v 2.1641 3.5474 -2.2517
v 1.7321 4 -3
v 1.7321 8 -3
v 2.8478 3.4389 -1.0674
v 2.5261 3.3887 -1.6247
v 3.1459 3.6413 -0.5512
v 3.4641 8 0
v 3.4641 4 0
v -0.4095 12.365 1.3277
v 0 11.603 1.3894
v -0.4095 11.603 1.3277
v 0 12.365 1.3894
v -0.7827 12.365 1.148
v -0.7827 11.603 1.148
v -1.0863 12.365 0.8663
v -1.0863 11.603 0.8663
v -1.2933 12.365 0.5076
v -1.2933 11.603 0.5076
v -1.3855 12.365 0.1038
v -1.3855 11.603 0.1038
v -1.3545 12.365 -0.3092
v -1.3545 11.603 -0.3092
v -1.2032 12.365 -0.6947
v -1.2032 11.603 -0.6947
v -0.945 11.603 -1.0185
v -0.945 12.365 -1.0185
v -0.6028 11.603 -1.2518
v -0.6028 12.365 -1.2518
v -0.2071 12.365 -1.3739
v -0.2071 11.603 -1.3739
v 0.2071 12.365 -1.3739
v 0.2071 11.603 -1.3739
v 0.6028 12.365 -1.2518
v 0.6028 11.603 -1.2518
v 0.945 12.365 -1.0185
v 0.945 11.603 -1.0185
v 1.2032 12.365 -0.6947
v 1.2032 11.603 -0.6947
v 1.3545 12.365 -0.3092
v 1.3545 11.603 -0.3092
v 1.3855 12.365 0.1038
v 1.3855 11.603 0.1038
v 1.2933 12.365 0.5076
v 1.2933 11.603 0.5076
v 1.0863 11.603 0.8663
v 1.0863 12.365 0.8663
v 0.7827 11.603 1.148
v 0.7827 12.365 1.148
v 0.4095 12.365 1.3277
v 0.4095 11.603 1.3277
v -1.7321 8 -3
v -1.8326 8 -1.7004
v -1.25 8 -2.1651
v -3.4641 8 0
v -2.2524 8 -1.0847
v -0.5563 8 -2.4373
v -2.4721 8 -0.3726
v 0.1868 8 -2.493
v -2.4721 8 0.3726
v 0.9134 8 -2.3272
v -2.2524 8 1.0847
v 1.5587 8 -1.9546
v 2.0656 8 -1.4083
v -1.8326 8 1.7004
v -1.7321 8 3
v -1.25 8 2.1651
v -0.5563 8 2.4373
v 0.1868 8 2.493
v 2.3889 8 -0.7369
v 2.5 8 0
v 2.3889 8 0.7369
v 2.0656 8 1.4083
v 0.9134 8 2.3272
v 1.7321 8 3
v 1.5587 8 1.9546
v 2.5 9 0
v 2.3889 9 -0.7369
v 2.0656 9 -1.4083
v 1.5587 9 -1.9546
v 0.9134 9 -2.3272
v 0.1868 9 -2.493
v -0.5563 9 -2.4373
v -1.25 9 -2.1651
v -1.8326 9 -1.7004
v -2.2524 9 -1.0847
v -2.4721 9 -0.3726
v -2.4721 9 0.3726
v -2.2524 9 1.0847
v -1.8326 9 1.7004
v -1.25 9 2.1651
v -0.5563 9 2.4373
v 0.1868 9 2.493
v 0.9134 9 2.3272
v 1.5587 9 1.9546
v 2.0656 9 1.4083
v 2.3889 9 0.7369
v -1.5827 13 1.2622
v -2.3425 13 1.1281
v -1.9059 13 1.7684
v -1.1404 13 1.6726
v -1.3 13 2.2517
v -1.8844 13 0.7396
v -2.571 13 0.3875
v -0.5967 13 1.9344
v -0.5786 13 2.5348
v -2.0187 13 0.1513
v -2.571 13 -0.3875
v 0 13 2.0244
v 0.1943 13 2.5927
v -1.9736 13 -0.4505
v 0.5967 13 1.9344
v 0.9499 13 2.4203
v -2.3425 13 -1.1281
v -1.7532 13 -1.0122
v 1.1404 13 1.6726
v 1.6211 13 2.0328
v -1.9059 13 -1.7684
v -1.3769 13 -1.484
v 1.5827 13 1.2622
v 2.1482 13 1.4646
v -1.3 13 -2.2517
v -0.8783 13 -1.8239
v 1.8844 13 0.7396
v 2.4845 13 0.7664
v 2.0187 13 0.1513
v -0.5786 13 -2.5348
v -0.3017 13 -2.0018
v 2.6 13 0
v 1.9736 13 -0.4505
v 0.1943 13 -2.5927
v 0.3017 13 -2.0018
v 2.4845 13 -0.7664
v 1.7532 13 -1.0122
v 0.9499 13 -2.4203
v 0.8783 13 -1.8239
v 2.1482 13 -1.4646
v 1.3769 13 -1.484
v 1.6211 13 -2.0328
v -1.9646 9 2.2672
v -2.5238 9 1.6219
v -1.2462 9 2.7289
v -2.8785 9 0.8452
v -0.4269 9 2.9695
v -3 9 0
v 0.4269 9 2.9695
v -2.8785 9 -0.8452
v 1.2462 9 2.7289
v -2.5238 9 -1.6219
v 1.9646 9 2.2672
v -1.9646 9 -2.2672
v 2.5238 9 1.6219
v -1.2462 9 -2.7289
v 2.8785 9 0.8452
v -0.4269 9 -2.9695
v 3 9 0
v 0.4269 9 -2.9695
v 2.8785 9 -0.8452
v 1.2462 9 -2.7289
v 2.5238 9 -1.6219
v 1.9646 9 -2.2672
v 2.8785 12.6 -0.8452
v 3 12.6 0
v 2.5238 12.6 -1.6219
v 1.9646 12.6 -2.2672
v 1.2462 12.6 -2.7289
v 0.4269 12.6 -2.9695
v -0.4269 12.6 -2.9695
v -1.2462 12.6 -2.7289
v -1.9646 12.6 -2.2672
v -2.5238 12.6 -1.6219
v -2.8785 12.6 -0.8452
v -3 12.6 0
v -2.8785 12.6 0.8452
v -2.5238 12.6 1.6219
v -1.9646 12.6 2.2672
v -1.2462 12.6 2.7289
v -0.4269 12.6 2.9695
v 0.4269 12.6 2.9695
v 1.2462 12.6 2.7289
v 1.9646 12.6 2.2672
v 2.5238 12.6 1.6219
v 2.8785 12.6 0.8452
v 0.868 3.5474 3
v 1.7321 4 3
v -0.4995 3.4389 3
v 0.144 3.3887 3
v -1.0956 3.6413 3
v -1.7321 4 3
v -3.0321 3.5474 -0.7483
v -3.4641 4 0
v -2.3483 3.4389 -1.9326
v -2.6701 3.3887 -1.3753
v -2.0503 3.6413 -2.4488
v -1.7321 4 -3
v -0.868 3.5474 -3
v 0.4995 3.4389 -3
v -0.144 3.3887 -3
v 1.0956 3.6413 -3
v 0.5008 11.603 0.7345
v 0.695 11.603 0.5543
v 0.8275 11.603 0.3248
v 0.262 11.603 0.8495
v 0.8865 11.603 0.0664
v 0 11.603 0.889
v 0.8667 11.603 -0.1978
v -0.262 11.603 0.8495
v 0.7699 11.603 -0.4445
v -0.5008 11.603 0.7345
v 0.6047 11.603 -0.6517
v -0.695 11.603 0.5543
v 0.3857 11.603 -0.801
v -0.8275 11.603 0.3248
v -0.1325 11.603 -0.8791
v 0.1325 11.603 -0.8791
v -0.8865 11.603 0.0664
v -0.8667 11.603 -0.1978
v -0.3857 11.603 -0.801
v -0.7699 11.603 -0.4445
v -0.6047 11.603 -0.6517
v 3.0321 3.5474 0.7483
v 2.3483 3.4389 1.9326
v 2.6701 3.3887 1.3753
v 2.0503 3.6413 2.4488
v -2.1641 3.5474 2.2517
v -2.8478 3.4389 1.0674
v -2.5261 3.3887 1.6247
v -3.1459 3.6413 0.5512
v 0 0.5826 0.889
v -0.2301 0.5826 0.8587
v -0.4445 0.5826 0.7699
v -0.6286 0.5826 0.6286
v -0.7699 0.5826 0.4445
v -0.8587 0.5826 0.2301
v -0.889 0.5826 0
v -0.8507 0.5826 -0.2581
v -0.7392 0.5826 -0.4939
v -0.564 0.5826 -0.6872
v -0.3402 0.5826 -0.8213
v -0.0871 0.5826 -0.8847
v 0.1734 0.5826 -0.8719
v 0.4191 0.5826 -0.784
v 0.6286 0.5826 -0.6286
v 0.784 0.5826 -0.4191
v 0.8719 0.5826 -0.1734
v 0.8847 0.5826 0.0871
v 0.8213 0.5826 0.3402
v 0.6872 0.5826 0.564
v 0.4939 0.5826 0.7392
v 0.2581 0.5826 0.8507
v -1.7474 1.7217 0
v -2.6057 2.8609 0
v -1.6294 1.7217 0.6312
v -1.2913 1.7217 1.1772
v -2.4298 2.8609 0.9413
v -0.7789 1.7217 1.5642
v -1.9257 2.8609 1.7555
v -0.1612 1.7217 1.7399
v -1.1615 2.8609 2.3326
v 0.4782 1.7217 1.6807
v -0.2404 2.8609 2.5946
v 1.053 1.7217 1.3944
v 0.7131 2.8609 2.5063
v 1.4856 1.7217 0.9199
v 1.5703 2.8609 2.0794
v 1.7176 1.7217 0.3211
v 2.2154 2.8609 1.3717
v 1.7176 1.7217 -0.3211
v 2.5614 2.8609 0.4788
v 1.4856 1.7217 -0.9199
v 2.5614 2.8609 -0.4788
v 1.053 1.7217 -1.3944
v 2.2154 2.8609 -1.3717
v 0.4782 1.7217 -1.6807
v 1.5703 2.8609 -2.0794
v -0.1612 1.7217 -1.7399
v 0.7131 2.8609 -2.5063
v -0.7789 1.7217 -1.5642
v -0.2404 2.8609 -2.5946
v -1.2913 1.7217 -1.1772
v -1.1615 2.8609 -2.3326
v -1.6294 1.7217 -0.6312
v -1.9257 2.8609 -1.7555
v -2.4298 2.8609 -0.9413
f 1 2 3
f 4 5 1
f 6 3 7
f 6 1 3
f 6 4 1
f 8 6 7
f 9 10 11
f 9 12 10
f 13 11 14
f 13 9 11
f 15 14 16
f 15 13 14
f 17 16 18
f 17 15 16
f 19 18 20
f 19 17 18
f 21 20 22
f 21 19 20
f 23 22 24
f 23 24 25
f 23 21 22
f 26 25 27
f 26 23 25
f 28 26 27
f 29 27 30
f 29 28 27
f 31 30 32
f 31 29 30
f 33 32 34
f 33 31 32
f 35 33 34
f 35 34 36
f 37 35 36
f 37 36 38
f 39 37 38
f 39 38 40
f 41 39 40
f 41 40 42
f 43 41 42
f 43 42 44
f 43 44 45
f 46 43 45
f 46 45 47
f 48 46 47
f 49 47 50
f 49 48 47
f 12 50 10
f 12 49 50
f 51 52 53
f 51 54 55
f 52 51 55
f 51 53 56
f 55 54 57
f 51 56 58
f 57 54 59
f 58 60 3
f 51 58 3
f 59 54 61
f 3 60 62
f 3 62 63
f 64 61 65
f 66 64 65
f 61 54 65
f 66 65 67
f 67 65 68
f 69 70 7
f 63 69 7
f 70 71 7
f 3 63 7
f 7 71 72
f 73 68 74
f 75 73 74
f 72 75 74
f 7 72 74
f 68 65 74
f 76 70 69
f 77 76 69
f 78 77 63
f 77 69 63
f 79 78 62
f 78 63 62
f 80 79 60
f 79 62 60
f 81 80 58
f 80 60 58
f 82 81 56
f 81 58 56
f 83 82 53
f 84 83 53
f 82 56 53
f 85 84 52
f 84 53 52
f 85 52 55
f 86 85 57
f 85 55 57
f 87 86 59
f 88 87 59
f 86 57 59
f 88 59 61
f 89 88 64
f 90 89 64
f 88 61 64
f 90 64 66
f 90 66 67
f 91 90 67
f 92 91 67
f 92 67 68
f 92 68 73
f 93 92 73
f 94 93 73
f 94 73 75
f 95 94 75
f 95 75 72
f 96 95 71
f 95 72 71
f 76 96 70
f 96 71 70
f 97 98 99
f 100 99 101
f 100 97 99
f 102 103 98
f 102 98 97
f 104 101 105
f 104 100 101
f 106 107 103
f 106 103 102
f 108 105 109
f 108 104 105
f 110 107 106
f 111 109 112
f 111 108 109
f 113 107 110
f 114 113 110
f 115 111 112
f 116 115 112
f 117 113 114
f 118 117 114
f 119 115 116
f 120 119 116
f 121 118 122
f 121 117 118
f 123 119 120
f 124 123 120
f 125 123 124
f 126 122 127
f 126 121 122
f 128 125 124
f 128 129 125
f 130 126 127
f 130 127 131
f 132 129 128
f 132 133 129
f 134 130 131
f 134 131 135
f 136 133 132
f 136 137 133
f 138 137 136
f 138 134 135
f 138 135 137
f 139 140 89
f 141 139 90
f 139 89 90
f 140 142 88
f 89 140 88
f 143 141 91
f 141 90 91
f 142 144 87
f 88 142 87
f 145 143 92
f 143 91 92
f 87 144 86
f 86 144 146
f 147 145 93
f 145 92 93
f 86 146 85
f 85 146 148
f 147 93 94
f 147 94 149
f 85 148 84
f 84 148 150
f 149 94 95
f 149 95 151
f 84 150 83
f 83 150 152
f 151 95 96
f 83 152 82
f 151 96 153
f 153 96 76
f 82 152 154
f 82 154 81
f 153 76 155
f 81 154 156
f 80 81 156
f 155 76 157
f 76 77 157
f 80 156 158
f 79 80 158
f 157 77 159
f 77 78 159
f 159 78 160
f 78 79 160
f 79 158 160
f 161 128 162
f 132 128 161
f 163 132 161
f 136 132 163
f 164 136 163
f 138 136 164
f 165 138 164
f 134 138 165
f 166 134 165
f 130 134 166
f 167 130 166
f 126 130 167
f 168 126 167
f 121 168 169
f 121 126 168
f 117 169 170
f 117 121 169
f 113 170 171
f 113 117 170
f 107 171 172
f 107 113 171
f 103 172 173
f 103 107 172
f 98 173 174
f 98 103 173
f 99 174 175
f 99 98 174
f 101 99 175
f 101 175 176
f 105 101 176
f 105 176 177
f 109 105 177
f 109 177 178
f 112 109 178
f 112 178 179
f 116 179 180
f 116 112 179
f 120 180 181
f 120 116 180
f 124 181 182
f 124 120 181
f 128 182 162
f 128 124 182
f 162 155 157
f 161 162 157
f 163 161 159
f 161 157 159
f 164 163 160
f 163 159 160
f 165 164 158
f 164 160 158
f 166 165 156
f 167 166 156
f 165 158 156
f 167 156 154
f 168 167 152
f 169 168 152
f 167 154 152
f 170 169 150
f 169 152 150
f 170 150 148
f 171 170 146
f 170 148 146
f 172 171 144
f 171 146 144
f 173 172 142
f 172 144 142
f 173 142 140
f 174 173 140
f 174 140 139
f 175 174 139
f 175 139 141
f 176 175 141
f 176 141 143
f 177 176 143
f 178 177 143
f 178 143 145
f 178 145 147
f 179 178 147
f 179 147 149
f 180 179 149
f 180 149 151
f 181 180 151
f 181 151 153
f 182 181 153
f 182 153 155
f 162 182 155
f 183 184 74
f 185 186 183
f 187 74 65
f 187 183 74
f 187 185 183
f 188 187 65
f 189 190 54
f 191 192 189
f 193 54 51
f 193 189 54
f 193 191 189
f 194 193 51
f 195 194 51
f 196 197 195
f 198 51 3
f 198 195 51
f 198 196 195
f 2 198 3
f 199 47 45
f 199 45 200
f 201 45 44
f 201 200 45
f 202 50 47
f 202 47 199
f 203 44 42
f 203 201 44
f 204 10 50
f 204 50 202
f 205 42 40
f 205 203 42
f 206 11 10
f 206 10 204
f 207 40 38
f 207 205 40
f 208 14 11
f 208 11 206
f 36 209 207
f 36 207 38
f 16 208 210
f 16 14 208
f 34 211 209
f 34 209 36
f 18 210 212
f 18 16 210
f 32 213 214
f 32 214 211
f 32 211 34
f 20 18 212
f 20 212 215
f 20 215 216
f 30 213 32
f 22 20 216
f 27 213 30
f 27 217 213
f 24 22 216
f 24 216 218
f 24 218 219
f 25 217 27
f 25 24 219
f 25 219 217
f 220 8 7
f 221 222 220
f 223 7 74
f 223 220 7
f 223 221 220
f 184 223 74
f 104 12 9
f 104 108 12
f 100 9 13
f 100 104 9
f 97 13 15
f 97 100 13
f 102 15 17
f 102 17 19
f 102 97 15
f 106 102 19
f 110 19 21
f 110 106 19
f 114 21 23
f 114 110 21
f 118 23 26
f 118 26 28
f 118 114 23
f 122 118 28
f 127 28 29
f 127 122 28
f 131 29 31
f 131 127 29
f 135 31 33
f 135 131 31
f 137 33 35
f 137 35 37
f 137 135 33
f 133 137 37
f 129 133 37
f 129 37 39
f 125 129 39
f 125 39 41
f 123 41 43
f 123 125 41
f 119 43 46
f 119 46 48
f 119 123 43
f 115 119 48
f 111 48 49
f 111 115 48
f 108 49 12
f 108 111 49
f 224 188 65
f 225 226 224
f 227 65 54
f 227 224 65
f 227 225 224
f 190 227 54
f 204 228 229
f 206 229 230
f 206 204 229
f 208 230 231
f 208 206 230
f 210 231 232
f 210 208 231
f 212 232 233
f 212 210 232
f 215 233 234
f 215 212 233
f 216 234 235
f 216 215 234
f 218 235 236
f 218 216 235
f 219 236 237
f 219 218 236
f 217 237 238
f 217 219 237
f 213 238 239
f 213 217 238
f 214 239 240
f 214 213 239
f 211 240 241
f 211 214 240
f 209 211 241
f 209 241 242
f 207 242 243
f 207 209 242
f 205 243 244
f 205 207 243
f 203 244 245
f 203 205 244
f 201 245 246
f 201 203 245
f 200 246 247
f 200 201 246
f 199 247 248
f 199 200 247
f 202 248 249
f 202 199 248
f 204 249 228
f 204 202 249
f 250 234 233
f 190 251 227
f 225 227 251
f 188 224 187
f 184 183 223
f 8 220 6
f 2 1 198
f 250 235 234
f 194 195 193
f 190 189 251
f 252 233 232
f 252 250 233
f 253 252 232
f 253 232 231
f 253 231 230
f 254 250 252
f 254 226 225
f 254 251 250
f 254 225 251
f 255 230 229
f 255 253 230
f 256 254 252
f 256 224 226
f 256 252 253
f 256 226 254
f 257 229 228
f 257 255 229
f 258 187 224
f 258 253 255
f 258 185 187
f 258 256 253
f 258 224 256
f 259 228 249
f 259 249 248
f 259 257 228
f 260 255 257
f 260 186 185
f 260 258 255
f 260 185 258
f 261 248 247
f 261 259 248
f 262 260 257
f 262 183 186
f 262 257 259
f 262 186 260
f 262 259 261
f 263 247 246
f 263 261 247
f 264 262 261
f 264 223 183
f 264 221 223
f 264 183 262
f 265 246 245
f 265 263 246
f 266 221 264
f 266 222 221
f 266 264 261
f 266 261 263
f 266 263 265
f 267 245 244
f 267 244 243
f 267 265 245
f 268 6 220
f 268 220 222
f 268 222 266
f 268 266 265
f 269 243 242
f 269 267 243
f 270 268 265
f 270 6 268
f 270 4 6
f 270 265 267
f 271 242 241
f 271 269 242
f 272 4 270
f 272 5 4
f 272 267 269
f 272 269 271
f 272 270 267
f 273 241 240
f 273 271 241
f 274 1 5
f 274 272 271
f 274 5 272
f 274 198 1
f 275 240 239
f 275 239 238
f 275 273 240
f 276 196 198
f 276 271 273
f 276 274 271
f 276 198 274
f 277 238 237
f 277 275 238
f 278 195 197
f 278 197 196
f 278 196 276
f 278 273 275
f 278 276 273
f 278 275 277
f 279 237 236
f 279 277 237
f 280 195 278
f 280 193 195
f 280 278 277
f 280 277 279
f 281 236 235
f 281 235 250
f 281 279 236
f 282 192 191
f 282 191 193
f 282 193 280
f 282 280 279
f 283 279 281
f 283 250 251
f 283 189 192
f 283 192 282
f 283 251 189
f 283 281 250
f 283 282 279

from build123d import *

# Parameters (mm, degrees)
SKETCH2_R           = 3
BOSS_EXTRUDE1_DEPTH = 13
BOSS_EXTRUDE2_DEPTH = 8
SKETCH6_R           = 3
SKETCH6_R_2         = 2.5
CUT_EXTRUDE1_DEPTH  = 1
CHAMFER1_SIZE       = 0.4
SKETCH7_R           = 0.2
CUT_EXTRUDE2_DEPTH  = 14


with BuildPart() as part:
    # Sketch2 → Boss-Extrude1 (new body)
    with BuildSketch(Plane(origin=(0, 0, 0), x_dir=(1, 0, 0), z_dir=(0, 1, 0))):
        Circle(SKETCH2_R)
    extrude(amount=BOSS_EXTRUDE1_DEPTH)

    # Sketch3 → Boss-Extrude2 (add)
    with BuildSketch(Plane.XZ):
        Polygon((1.732050808, -3), (3.464101615, 0), (1.732050808, 3), (-1.732050808, 3), (-3.464101615, 0), (-1.732050808, -3), align=None)
    extrude(amount=-BOSS_EXTRUDE2_DEPTH)

    # Sketch4 → Cut-Revolve3 (revolve, cut)
    with BuildSketch(Plane.XY):
        Polygon((-0.45, 0), (-3.464101615, 4), (-3.464101615, 0), align=None)
    revolve(axis=Axis((0, 0, 0), (0, 1, 0)), mode=Mode.SUBTRACT)

    # Sketch6 → Cut-Extrude1 (cut)
    with BuildSketch(Plane(origin=(0, 8, 0), x_dir=(1, 0, 0), z_dir=(0, 1, 0))):
        Circle(SKETCH6_R)
        Circle(SKETCH6_R_2, mode=Mode.SUBTRACT)
    extrude(amount=CUT_EXTRUDE1_DEPTH, mode=Mode.SUBTRACT)

    # Chamfer1
    chamfer1_edges = [part.edges().sort_by_distance(p)[0] for p in [
        (-3, 13, 0),
    ]]
    chamfer(chamfer1_edges, length=CHAMFER1_SIZE)

    # Sketch7 → Cut-Extrude2 (cut, through all)
    with BuildSketch(Plane.XZ):
        Circle(SKETCH7_R)
    extrude(amount=-CUT_EXTRUDE2_DEPTH, mode=Mode.SUBTRACT)

    # Sketch9 → CBORE for #0 Fillister Head Machine Screw1 (revolve, cut)
    with BuildSketch(Plane(origin=(0, 13, 0), x_dir=(0, 0, 1), z_dir=(1, 0, 0))):
        Polygon((0, 0), (0, 13), (0.889, 13), (0.889, 1.397), (1.38938, 1.397), (1.38938, 0.635), (2.02438, 0), align=None)
    revolve(axis=Axis((0, 19.35, 0), (0, -1, 0)), mode=Mode.SUBTRACT)


solid = part.part
